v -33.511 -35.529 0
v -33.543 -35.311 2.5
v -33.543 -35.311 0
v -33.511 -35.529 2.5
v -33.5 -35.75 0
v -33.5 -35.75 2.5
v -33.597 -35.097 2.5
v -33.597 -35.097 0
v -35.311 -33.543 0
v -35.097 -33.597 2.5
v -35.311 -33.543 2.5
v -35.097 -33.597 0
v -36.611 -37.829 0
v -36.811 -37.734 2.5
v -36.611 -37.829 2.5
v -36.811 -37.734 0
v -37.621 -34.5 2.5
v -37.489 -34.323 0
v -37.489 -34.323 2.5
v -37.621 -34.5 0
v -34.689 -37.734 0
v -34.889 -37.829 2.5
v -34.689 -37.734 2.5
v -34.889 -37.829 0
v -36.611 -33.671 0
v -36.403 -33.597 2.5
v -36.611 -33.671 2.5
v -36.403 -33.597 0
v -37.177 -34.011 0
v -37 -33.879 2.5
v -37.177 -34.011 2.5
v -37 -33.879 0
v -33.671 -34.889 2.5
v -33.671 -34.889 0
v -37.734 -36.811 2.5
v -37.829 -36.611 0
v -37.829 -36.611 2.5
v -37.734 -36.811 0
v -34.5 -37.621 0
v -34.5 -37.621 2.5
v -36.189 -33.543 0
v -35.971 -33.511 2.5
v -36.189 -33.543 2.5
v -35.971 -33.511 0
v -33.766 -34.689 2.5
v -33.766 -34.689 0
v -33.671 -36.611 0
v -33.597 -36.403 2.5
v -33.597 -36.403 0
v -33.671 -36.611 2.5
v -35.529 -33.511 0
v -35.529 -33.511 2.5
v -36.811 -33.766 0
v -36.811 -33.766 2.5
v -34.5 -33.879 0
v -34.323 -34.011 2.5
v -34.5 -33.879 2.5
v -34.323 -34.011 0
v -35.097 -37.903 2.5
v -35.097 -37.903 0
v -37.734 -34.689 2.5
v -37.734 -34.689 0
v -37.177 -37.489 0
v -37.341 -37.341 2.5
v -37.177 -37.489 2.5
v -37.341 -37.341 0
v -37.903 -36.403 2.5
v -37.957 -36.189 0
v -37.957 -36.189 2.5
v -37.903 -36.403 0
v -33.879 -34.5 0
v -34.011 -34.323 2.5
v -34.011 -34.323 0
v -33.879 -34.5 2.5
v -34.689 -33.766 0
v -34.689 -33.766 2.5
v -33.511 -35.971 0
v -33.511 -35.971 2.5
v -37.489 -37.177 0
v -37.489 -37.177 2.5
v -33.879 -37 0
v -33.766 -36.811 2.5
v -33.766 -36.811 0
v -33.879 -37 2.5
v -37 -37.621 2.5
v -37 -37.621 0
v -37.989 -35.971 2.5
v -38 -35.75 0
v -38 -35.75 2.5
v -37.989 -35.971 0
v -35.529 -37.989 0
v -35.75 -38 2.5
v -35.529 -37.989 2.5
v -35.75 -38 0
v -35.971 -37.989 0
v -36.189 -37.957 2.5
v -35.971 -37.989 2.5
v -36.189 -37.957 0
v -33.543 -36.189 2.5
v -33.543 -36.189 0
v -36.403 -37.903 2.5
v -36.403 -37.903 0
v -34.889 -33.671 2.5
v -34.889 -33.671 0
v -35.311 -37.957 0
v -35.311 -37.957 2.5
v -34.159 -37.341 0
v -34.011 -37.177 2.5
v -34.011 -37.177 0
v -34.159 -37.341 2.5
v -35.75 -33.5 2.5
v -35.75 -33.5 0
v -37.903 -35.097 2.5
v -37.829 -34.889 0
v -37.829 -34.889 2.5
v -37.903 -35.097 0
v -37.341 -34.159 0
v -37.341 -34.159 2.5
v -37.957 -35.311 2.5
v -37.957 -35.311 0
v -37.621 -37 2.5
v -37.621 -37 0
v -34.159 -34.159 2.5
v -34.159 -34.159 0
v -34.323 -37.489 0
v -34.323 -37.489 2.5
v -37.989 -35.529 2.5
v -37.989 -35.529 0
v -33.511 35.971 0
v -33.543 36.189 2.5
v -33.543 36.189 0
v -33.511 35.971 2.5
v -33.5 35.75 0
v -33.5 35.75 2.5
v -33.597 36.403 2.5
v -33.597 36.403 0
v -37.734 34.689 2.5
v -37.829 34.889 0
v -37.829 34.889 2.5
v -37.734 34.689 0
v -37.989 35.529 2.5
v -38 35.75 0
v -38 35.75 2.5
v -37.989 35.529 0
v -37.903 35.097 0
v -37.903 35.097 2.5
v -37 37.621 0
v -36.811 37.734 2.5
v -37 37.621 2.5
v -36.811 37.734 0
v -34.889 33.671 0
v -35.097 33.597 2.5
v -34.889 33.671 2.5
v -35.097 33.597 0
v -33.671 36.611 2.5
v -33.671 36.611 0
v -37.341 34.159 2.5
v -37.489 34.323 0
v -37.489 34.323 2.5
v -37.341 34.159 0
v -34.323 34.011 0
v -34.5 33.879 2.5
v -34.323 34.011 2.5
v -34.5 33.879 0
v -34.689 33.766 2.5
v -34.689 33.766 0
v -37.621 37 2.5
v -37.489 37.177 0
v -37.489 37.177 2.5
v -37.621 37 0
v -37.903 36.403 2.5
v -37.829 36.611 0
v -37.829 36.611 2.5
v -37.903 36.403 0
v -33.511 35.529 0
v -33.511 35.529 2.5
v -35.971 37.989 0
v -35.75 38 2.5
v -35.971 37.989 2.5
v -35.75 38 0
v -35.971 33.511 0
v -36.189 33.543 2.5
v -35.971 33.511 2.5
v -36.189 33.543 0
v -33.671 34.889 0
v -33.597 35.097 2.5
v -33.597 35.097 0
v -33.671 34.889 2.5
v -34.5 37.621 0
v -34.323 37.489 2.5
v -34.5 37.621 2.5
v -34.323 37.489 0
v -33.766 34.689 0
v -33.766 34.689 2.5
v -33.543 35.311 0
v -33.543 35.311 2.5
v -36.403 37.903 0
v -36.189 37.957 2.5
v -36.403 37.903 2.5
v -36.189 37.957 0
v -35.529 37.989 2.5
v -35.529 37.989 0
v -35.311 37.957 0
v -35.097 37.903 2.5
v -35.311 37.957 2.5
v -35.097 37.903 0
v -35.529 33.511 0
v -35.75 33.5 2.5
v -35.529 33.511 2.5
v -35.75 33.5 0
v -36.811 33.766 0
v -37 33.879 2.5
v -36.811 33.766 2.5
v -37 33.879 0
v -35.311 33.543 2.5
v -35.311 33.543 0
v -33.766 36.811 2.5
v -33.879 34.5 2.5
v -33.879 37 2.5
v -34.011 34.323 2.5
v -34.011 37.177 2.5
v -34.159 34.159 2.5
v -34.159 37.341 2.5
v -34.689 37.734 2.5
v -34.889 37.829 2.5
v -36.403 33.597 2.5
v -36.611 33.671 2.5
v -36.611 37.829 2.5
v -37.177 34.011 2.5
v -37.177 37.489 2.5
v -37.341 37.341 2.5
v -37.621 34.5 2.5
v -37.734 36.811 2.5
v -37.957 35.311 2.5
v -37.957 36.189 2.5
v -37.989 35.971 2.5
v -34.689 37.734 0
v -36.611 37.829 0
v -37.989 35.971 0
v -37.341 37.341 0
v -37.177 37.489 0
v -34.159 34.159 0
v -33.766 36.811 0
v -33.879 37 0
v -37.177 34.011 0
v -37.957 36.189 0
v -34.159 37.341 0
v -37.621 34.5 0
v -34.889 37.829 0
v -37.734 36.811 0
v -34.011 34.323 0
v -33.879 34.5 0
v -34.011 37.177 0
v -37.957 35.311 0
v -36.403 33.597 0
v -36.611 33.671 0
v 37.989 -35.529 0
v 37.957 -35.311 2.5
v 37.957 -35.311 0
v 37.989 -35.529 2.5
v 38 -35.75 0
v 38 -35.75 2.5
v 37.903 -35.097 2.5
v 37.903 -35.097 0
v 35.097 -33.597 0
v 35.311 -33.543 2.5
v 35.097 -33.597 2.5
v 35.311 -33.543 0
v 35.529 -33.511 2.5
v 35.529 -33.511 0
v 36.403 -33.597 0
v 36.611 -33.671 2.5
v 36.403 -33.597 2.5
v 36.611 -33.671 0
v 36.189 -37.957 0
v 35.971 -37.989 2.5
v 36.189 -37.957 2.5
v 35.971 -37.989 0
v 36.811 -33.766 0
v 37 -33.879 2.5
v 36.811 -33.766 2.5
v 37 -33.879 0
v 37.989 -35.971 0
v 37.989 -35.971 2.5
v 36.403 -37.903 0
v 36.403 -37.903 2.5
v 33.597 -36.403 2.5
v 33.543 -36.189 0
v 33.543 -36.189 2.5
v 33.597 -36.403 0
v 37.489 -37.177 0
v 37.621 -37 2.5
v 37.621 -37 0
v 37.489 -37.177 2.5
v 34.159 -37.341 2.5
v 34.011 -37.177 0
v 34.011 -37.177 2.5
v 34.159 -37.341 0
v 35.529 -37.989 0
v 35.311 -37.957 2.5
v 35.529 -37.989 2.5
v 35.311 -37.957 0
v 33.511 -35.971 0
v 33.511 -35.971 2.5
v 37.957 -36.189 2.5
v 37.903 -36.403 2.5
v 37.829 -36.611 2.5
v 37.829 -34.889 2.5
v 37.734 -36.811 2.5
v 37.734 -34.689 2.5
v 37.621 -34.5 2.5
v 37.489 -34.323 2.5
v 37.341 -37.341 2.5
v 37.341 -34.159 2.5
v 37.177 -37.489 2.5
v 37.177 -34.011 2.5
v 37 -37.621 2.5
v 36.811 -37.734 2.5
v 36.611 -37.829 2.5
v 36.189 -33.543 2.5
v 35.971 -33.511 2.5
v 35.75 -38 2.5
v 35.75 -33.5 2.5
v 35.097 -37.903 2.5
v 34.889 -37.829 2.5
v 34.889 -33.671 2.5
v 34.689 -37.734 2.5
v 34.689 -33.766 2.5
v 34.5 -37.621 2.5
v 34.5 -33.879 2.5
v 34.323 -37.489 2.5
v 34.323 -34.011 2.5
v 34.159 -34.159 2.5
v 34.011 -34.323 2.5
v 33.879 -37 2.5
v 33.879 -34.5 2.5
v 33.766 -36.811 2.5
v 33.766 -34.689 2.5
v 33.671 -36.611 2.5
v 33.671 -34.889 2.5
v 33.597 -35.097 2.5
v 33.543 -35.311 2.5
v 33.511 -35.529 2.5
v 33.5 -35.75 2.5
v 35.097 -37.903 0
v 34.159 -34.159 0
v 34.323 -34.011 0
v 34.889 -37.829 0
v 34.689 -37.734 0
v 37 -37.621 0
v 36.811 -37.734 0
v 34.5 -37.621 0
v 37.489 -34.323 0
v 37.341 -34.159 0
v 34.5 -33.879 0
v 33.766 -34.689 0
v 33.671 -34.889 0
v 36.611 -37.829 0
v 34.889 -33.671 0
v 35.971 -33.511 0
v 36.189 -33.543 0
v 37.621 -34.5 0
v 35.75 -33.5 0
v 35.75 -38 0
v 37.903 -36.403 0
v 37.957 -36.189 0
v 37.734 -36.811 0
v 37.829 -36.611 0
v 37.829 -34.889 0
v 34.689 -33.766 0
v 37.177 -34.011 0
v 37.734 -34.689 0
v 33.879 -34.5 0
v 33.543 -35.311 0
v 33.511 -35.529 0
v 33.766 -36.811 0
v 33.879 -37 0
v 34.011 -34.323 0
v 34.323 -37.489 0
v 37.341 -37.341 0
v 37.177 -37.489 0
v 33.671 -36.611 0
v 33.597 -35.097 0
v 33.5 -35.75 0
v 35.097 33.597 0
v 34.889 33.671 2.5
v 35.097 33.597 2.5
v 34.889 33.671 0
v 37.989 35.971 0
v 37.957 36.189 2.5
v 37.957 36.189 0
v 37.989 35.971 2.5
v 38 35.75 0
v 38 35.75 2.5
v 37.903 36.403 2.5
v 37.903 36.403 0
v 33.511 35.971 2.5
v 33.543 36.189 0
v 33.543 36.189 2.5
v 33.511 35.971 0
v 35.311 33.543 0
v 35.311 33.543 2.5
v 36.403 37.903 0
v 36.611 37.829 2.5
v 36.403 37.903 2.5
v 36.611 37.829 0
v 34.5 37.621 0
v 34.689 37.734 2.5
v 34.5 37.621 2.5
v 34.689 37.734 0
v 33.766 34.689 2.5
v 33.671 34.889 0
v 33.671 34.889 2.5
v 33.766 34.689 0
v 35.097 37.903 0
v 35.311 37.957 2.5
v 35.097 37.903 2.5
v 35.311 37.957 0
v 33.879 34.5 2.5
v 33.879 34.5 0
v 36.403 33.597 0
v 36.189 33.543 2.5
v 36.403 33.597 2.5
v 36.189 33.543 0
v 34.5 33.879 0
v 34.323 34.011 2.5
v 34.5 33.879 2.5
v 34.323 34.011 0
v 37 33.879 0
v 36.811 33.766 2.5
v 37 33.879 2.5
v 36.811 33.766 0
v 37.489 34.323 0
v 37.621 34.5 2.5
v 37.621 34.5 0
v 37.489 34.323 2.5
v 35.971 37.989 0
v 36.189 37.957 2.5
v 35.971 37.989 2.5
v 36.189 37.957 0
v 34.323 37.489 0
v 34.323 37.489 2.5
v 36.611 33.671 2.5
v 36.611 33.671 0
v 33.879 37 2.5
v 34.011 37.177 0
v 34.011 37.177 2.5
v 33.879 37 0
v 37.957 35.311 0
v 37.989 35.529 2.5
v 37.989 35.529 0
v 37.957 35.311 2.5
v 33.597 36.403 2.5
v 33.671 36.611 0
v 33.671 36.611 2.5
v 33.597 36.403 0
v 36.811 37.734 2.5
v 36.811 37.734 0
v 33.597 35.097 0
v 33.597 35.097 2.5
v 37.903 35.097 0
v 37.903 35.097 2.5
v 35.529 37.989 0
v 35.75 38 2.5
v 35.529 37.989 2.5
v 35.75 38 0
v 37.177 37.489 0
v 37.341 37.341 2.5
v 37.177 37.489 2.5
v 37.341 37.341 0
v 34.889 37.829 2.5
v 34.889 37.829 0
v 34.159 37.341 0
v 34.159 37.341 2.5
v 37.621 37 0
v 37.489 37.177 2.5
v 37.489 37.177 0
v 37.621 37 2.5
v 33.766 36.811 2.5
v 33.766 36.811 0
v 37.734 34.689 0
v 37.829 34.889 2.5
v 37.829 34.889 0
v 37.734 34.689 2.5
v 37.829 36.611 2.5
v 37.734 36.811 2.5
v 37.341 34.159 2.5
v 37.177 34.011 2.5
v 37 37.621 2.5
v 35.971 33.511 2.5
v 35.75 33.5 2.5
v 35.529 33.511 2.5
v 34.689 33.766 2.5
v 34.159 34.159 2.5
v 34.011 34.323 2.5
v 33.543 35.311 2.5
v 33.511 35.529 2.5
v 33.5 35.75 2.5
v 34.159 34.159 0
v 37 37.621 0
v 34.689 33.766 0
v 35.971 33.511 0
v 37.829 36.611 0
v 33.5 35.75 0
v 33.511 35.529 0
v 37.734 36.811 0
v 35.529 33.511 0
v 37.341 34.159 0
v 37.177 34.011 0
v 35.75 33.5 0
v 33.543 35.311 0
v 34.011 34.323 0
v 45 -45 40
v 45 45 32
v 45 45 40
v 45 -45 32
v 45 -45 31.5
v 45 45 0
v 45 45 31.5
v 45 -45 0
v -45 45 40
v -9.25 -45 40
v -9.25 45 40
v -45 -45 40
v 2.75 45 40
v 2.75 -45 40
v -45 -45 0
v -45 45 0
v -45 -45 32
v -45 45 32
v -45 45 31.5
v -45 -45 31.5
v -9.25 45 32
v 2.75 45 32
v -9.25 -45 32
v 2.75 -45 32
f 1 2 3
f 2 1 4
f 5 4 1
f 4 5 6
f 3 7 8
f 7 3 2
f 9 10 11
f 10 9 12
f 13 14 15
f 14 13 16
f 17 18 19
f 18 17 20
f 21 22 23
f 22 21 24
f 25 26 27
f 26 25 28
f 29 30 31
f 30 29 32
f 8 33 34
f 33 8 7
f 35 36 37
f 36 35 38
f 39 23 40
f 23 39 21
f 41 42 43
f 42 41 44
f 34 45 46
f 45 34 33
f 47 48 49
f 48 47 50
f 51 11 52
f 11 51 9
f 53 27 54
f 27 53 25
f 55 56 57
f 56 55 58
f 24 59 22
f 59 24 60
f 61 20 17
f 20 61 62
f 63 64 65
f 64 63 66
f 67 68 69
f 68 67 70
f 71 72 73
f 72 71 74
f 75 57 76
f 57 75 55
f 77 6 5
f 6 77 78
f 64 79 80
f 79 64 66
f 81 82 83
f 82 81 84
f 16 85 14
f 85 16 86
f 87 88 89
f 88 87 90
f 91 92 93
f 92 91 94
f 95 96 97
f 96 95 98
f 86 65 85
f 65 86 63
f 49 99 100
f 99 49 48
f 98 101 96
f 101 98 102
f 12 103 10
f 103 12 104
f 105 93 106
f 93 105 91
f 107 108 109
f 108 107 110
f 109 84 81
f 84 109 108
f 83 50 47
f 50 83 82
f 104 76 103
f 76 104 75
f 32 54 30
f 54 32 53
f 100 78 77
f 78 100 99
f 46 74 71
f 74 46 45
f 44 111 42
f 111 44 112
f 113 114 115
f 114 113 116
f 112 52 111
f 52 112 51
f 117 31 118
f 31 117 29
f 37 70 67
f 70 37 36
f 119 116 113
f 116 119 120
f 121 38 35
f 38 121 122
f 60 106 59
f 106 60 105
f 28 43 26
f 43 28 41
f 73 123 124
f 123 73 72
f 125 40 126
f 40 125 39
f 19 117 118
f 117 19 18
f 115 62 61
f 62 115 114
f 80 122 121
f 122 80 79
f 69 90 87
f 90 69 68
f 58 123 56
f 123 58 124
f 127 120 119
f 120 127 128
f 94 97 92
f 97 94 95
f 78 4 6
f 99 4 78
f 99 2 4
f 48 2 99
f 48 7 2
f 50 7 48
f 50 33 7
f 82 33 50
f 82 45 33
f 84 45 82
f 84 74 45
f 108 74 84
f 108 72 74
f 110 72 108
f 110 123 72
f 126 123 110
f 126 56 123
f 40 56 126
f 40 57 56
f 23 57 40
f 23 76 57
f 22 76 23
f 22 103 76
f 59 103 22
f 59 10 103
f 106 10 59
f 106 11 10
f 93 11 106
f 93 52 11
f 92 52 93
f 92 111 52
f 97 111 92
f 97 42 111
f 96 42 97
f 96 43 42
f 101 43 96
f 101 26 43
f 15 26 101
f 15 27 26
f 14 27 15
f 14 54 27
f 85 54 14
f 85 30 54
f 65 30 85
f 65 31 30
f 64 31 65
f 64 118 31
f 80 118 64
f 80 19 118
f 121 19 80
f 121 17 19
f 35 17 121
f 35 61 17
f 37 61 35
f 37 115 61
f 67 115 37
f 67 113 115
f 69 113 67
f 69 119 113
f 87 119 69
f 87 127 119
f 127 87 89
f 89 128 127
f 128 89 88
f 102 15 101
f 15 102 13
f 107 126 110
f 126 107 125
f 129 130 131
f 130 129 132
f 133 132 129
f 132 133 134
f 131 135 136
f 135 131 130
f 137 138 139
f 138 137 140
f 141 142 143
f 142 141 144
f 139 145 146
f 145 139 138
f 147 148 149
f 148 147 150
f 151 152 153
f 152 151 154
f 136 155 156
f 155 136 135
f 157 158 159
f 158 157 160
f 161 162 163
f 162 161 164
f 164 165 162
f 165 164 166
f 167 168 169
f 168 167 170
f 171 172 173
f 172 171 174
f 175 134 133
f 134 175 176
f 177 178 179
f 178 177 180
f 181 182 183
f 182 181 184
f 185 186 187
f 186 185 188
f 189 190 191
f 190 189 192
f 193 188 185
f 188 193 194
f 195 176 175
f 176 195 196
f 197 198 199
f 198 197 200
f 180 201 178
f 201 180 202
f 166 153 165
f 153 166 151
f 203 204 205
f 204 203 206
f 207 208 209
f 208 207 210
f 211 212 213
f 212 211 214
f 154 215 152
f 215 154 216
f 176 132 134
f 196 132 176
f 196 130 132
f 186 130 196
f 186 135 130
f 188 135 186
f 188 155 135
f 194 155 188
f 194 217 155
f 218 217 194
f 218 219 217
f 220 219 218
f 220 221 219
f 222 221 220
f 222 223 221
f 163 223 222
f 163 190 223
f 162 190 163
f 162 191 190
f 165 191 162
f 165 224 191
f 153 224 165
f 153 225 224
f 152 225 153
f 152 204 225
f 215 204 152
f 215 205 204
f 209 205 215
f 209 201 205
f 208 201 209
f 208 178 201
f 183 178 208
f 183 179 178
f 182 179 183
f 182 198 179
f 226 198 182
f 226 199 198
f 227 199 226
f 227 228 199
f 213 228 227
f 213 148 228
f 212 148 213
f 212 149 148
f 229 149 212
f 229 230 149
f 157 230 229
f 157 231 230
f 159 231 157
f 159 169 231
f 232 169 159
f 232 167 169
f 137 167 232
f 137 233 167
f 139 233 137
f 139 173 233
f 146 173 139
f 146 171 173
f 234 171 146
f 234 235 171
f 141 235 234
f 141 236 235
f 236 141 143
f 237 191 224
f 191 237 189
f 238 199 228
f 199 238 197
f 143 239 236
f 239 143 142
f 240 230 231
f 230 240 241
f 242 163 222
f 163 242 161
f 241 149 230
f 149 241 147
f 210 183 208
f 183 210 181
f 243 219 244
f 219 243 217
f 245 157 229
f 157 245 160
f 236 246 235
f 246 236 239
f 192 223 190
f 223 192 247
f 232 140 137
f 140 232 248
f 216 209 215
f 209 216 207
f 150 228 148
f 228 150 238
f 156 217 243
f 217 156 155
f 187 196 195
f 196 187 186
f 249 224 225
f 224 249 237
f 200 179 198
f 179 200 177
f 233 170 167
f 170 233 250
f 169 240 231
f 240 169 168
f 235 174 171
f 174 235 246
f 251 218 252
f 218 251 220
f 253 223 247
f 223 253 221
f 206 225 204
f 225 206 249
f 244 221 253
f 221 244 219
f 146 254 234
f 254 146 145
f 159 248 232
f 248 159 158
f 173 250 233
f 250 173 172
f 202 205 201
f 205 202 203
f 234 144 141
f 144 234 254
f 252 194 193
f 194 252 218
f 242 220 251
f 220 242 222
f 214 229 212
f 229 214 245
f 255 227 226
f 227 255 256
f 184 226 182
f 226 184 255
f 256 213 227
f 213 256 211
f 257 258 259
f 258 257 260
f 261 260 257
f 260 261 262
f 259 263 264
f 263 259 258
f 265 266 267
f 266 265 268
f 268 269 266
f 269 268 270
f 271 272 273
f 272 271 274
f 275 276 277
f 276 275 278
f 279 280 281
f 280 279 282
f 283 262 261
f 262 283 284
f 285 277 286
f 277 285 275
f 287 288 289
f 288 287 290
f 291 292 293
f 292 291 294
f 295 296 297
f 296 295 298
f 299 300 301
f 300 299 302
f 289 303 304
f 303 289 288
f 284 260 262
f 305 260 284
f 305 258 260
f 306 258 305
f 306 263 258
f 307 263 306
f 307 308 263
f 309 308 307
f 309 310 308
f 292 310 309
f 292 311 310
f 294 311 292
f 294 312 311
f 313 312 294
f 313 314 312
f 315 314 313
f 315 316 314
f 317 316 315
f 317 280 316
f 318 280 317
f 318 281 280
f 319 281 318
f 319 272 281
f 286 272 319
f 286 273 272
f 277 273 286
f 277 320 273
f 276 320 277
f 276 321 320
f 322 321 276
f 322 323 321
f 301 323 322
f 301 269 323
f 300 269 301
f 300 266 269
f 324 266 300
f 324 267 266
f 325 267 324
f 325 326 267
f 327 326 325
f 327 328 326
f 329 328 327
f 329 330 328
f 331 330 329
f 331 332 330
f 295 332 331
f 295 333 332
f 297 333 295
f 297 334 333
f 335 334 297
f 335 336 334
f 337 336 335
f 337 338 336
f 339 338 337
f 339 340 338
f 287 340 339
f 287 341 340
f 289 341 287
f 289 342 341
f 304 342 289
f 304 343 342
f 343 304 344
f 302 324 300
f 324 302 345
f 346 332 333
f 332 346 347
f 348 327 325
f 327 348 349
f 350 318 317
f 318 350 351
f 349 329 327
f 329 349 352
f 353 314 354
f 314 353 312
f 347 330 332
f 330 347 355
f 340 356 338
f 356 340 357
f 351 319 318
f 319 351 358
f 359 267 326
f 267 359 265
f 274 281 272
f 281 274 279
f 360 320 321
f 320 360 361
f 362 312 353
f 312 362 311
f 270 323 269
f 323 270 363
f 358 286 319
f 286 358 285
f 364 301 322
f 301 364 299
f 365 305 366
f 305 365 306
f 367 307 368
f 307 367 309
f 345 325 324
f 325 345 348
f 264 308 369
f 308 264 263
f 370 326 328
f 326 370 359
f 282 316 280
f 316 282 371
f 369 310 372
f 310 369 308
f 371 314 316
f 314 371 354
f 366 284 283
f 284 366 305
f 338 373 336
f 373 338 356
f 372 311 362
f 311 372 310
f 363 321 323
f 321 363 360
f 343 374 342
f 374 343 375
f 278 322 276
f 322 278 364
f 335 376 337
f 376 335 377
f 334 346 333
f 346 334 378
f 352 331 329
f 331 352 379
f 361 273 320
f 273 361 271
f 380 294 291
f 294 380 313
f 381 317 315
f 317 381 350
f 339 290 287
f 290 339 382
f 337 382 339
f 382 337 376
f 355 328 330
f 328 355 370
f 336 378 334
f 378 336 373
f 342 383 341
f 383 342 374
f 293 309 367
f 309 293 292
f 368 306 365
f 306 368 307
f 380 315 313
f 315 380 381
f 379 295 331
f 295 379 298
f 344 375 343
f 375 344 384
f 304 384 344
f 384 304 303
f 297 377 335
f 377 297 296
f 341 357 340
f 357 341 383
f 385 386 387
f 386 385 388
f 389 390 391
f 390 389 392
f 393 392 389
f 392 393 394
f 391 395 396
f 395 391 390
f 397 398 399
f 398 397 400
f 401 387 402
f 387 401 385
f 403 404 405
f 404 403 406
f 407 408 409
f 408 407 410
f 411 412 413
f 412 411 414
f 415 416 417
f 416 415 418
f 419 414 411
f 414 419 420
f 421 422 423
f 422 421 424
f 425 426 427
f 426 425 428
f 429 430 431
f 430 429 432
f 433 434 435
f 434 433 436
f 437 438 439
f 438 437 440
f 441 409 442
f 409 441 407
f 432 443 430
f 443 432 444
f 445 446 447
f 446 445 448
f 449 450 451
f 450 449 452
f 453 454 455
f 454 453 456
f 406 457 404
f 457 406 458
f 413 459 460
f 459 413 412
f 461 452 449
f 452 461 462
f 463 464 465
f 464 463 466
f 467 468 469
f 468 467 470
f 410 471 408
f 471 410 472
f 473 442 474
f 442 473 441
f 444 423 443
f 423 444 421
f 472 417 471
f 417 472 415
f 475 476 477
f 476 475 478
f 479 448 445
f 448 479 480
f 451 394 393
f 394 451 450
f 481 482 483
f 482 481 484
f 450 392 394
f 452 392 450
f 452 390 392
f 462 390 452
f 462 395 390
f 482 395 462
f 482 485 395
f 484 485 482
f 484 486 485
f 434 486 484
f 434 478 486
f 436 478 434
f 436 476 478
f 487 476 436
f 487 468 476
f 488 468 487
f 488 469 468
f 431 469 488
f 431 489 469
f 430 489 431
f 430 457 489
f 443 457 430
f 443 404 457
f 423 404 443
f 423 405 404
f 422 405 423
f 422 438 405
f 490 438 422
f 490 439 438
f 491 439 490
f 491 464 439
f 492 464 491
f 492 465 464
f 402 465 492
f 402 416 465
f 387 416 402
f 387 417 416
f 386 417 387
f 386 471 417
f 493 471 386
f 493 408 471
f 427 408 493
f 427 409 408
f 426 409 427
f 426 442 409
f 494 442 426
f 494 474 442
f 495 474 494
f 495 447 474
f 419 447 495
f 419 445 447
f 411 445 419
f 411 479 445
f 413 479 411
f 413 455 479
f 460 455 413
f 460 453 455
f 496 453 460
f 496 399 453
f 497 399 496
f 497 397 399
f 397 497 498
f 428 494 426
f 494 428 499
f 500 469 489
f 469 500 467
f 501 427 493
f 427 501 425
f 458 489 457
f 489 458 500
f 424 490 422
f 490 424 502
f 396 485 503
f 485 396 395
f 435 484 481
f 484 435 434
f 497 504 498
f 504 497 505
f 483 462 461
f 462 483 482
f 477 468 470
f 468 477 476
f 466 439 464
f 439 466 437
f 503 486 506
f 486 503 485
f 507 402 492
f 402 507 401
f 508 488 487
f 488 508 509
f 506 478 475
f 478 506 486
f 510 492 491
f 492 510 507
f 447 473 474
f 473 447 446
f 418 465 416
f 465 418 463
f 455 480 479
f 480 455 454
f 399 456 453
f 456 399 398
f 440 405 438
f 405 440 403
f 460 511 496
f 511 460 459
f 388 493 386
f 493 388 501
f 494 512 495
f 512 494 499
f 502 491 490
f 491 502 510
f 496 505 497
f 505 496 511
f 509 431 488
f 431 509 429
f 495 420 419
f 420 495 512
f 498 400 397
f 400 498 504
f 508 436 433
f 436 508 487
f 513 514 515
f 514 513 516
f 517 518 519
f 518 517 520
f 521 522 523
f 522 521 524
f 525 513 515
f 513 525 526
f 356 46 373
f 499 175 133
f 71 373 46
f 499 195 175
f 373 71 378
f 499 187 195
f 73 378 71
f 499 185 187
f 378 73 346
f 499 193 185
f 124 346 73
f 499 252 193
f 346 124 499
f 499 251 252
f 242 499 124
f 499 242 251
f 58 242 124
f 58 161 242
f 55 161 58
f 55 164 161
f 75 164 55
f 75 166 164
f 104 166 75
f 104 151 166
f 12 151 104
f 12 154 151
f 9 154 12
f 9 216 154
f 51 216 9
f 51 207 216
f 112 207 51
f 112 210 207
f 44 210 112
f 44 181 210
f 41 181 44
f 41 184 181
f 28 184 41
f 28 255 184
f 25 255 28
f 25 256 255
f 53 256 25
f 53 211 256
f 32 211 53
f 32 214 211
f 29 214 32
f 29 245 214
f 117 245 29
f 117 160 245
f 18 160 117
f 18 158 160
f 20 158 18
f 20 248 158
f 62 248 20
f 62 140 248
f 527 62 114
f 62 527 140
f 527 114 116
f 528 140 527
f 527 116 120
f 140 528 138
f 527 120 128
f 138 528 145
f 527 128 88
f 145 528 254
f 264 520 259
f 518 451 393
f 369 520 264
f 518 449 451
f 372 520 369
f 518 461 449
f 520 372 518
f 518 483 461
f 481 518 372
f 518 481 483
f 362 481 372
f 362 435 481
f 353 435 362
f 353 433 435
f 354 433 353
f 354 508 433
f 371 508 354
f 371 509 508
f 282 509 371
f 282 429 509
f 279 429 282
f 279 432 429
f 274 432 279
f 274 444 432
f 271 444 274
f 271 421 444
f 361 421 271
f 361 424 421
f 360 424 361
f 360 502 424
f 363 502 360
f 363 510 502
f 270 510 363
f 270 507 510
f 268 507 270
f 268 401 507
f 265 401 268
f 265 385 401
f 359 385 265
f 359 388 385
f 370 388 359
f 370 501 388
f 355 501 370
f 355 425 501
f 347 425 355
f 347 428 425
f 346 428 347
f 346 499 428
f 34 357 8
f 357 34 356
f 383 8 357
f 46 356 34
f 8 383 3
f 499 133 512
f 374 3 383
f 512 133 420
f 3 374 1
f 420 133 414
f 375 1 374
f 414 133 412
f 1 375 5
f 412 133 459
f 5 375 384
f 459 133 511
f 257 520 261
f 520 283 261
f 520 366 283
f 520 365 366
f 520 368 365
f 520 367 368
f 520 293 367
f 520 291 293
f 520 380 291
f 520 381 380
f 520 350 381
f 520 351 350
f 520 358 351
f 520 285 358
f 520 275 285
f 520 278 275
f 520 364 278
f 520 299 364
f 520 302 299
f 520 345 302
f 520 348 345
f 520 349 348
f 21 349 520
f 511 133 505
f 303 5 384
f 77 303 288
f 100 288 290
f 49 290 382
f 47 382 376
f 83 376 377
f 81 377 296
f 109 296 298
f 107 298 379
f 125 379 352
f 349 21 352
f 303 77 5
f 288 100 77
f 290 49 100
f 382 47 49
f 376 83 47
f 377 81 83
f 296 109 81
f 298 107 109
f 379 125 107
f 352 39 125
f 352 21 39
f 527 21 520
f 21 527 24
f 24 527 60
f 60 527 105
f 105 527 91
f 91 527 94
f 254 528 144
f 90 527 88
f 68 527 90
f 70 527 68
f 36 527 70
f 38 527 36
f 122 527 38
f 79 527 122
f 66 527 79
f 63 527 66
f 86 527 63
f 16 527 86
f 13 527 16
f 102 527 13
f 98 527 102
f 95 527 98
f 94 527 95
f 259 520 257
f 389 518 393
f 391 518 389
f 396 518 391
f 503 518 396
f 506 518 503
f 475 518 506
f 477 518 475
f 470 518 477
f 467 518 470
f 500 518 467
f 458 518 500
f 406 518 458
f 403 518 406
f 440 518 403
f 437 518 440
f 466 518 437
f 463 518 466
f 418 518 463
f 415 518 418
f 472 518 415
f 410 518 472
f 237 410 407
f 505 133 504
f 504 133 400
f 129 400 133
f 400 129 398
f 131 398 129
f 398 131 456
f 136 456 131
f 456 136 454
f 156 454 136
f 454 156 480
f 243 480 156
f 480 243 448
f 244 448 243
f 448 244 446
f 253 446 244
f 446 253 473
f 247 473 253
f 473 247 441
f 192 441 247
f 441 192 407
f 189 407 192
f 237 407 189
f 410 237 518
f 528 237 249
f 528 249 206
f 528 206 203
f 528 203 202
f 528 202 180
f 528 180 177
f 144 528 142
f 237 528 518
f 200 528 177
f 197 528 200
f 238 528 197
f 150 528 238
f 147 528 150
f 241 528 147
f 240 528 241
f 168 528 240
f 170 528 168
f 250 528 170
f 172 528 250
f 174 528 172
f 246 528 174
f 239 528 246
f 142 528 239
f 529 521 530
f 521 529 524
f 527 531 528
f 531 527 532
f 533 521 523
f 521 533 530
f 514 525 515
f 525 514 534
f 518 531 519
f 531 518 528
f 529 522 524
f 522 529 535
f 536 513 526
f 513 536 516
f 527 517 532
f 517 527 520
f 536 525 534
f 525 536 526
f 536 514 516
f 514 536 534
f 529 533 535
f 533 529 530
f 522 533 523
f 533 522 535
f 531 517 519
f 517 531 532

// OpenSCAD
// Magnetic stirrer housing - upside-down open box over 80 mm PC fan
// Print orientation: top plate on bed (z = 0), walls rise to open top (z = 40)

// ---------- Parameters ----------
plate_t      = 2;     // top plate thickness
wall_t       = 2.5;   // wall thickness
box_h        = 40;    // total height of box (open top at z = 40)
outer_x      = 90;    // outer size in X
outer_y      = 90;    // outer size in Y
screw_d      = 4.5;   // M4 screw hole diameter
screw_count  = 4;     // number of screw holes
screw_pitch  = 71.5;  // square pattern side-to-side hole spacing
notch_w      = 12;    // cable notch width
notch_depth  = 8;     // cable notch depth from open edge (z = 32 to z = 40)
eps          = 0.5;   // cutter overshoot past faces

$fn = 64;

// ---------- Model ----------
difference() {
    // Outer block
    translate([-outer_x / 2, -outer_y / 2, 0])
        cube([outer_x, outer_y, box_h]);

    // Screw holes through top plate, centred on plate
    for (i = [0 : screw_count - 1]) {
        for (j = [0 : screw_count - 1]) {
            x = (i - (screw_count - 1) / 2) * screw_pitch;
            y = (j - (screw_count - 1) / 2) * screw_pitch;
            translate([x, y, -eps])
                cylinder(d = screw_d, h = plate_t + 2 * eps);
        }
    }

    // Cable notch in one wall, centred along wall, from z = 32 to z = 40
    translate([-outer_x / 2 + screw_pitch / 2, -outer_y / 2, box_h - notch_depth])
        cube([notch_w, outer_y, notch_depth + eps]);

    // Floor under notch to avoid coincident faces
    translate([-outer_x / 2, -outer_y / 2, box_h - notch_depth - eps])
        cube([outer_x, outer_y, eps]);
}
